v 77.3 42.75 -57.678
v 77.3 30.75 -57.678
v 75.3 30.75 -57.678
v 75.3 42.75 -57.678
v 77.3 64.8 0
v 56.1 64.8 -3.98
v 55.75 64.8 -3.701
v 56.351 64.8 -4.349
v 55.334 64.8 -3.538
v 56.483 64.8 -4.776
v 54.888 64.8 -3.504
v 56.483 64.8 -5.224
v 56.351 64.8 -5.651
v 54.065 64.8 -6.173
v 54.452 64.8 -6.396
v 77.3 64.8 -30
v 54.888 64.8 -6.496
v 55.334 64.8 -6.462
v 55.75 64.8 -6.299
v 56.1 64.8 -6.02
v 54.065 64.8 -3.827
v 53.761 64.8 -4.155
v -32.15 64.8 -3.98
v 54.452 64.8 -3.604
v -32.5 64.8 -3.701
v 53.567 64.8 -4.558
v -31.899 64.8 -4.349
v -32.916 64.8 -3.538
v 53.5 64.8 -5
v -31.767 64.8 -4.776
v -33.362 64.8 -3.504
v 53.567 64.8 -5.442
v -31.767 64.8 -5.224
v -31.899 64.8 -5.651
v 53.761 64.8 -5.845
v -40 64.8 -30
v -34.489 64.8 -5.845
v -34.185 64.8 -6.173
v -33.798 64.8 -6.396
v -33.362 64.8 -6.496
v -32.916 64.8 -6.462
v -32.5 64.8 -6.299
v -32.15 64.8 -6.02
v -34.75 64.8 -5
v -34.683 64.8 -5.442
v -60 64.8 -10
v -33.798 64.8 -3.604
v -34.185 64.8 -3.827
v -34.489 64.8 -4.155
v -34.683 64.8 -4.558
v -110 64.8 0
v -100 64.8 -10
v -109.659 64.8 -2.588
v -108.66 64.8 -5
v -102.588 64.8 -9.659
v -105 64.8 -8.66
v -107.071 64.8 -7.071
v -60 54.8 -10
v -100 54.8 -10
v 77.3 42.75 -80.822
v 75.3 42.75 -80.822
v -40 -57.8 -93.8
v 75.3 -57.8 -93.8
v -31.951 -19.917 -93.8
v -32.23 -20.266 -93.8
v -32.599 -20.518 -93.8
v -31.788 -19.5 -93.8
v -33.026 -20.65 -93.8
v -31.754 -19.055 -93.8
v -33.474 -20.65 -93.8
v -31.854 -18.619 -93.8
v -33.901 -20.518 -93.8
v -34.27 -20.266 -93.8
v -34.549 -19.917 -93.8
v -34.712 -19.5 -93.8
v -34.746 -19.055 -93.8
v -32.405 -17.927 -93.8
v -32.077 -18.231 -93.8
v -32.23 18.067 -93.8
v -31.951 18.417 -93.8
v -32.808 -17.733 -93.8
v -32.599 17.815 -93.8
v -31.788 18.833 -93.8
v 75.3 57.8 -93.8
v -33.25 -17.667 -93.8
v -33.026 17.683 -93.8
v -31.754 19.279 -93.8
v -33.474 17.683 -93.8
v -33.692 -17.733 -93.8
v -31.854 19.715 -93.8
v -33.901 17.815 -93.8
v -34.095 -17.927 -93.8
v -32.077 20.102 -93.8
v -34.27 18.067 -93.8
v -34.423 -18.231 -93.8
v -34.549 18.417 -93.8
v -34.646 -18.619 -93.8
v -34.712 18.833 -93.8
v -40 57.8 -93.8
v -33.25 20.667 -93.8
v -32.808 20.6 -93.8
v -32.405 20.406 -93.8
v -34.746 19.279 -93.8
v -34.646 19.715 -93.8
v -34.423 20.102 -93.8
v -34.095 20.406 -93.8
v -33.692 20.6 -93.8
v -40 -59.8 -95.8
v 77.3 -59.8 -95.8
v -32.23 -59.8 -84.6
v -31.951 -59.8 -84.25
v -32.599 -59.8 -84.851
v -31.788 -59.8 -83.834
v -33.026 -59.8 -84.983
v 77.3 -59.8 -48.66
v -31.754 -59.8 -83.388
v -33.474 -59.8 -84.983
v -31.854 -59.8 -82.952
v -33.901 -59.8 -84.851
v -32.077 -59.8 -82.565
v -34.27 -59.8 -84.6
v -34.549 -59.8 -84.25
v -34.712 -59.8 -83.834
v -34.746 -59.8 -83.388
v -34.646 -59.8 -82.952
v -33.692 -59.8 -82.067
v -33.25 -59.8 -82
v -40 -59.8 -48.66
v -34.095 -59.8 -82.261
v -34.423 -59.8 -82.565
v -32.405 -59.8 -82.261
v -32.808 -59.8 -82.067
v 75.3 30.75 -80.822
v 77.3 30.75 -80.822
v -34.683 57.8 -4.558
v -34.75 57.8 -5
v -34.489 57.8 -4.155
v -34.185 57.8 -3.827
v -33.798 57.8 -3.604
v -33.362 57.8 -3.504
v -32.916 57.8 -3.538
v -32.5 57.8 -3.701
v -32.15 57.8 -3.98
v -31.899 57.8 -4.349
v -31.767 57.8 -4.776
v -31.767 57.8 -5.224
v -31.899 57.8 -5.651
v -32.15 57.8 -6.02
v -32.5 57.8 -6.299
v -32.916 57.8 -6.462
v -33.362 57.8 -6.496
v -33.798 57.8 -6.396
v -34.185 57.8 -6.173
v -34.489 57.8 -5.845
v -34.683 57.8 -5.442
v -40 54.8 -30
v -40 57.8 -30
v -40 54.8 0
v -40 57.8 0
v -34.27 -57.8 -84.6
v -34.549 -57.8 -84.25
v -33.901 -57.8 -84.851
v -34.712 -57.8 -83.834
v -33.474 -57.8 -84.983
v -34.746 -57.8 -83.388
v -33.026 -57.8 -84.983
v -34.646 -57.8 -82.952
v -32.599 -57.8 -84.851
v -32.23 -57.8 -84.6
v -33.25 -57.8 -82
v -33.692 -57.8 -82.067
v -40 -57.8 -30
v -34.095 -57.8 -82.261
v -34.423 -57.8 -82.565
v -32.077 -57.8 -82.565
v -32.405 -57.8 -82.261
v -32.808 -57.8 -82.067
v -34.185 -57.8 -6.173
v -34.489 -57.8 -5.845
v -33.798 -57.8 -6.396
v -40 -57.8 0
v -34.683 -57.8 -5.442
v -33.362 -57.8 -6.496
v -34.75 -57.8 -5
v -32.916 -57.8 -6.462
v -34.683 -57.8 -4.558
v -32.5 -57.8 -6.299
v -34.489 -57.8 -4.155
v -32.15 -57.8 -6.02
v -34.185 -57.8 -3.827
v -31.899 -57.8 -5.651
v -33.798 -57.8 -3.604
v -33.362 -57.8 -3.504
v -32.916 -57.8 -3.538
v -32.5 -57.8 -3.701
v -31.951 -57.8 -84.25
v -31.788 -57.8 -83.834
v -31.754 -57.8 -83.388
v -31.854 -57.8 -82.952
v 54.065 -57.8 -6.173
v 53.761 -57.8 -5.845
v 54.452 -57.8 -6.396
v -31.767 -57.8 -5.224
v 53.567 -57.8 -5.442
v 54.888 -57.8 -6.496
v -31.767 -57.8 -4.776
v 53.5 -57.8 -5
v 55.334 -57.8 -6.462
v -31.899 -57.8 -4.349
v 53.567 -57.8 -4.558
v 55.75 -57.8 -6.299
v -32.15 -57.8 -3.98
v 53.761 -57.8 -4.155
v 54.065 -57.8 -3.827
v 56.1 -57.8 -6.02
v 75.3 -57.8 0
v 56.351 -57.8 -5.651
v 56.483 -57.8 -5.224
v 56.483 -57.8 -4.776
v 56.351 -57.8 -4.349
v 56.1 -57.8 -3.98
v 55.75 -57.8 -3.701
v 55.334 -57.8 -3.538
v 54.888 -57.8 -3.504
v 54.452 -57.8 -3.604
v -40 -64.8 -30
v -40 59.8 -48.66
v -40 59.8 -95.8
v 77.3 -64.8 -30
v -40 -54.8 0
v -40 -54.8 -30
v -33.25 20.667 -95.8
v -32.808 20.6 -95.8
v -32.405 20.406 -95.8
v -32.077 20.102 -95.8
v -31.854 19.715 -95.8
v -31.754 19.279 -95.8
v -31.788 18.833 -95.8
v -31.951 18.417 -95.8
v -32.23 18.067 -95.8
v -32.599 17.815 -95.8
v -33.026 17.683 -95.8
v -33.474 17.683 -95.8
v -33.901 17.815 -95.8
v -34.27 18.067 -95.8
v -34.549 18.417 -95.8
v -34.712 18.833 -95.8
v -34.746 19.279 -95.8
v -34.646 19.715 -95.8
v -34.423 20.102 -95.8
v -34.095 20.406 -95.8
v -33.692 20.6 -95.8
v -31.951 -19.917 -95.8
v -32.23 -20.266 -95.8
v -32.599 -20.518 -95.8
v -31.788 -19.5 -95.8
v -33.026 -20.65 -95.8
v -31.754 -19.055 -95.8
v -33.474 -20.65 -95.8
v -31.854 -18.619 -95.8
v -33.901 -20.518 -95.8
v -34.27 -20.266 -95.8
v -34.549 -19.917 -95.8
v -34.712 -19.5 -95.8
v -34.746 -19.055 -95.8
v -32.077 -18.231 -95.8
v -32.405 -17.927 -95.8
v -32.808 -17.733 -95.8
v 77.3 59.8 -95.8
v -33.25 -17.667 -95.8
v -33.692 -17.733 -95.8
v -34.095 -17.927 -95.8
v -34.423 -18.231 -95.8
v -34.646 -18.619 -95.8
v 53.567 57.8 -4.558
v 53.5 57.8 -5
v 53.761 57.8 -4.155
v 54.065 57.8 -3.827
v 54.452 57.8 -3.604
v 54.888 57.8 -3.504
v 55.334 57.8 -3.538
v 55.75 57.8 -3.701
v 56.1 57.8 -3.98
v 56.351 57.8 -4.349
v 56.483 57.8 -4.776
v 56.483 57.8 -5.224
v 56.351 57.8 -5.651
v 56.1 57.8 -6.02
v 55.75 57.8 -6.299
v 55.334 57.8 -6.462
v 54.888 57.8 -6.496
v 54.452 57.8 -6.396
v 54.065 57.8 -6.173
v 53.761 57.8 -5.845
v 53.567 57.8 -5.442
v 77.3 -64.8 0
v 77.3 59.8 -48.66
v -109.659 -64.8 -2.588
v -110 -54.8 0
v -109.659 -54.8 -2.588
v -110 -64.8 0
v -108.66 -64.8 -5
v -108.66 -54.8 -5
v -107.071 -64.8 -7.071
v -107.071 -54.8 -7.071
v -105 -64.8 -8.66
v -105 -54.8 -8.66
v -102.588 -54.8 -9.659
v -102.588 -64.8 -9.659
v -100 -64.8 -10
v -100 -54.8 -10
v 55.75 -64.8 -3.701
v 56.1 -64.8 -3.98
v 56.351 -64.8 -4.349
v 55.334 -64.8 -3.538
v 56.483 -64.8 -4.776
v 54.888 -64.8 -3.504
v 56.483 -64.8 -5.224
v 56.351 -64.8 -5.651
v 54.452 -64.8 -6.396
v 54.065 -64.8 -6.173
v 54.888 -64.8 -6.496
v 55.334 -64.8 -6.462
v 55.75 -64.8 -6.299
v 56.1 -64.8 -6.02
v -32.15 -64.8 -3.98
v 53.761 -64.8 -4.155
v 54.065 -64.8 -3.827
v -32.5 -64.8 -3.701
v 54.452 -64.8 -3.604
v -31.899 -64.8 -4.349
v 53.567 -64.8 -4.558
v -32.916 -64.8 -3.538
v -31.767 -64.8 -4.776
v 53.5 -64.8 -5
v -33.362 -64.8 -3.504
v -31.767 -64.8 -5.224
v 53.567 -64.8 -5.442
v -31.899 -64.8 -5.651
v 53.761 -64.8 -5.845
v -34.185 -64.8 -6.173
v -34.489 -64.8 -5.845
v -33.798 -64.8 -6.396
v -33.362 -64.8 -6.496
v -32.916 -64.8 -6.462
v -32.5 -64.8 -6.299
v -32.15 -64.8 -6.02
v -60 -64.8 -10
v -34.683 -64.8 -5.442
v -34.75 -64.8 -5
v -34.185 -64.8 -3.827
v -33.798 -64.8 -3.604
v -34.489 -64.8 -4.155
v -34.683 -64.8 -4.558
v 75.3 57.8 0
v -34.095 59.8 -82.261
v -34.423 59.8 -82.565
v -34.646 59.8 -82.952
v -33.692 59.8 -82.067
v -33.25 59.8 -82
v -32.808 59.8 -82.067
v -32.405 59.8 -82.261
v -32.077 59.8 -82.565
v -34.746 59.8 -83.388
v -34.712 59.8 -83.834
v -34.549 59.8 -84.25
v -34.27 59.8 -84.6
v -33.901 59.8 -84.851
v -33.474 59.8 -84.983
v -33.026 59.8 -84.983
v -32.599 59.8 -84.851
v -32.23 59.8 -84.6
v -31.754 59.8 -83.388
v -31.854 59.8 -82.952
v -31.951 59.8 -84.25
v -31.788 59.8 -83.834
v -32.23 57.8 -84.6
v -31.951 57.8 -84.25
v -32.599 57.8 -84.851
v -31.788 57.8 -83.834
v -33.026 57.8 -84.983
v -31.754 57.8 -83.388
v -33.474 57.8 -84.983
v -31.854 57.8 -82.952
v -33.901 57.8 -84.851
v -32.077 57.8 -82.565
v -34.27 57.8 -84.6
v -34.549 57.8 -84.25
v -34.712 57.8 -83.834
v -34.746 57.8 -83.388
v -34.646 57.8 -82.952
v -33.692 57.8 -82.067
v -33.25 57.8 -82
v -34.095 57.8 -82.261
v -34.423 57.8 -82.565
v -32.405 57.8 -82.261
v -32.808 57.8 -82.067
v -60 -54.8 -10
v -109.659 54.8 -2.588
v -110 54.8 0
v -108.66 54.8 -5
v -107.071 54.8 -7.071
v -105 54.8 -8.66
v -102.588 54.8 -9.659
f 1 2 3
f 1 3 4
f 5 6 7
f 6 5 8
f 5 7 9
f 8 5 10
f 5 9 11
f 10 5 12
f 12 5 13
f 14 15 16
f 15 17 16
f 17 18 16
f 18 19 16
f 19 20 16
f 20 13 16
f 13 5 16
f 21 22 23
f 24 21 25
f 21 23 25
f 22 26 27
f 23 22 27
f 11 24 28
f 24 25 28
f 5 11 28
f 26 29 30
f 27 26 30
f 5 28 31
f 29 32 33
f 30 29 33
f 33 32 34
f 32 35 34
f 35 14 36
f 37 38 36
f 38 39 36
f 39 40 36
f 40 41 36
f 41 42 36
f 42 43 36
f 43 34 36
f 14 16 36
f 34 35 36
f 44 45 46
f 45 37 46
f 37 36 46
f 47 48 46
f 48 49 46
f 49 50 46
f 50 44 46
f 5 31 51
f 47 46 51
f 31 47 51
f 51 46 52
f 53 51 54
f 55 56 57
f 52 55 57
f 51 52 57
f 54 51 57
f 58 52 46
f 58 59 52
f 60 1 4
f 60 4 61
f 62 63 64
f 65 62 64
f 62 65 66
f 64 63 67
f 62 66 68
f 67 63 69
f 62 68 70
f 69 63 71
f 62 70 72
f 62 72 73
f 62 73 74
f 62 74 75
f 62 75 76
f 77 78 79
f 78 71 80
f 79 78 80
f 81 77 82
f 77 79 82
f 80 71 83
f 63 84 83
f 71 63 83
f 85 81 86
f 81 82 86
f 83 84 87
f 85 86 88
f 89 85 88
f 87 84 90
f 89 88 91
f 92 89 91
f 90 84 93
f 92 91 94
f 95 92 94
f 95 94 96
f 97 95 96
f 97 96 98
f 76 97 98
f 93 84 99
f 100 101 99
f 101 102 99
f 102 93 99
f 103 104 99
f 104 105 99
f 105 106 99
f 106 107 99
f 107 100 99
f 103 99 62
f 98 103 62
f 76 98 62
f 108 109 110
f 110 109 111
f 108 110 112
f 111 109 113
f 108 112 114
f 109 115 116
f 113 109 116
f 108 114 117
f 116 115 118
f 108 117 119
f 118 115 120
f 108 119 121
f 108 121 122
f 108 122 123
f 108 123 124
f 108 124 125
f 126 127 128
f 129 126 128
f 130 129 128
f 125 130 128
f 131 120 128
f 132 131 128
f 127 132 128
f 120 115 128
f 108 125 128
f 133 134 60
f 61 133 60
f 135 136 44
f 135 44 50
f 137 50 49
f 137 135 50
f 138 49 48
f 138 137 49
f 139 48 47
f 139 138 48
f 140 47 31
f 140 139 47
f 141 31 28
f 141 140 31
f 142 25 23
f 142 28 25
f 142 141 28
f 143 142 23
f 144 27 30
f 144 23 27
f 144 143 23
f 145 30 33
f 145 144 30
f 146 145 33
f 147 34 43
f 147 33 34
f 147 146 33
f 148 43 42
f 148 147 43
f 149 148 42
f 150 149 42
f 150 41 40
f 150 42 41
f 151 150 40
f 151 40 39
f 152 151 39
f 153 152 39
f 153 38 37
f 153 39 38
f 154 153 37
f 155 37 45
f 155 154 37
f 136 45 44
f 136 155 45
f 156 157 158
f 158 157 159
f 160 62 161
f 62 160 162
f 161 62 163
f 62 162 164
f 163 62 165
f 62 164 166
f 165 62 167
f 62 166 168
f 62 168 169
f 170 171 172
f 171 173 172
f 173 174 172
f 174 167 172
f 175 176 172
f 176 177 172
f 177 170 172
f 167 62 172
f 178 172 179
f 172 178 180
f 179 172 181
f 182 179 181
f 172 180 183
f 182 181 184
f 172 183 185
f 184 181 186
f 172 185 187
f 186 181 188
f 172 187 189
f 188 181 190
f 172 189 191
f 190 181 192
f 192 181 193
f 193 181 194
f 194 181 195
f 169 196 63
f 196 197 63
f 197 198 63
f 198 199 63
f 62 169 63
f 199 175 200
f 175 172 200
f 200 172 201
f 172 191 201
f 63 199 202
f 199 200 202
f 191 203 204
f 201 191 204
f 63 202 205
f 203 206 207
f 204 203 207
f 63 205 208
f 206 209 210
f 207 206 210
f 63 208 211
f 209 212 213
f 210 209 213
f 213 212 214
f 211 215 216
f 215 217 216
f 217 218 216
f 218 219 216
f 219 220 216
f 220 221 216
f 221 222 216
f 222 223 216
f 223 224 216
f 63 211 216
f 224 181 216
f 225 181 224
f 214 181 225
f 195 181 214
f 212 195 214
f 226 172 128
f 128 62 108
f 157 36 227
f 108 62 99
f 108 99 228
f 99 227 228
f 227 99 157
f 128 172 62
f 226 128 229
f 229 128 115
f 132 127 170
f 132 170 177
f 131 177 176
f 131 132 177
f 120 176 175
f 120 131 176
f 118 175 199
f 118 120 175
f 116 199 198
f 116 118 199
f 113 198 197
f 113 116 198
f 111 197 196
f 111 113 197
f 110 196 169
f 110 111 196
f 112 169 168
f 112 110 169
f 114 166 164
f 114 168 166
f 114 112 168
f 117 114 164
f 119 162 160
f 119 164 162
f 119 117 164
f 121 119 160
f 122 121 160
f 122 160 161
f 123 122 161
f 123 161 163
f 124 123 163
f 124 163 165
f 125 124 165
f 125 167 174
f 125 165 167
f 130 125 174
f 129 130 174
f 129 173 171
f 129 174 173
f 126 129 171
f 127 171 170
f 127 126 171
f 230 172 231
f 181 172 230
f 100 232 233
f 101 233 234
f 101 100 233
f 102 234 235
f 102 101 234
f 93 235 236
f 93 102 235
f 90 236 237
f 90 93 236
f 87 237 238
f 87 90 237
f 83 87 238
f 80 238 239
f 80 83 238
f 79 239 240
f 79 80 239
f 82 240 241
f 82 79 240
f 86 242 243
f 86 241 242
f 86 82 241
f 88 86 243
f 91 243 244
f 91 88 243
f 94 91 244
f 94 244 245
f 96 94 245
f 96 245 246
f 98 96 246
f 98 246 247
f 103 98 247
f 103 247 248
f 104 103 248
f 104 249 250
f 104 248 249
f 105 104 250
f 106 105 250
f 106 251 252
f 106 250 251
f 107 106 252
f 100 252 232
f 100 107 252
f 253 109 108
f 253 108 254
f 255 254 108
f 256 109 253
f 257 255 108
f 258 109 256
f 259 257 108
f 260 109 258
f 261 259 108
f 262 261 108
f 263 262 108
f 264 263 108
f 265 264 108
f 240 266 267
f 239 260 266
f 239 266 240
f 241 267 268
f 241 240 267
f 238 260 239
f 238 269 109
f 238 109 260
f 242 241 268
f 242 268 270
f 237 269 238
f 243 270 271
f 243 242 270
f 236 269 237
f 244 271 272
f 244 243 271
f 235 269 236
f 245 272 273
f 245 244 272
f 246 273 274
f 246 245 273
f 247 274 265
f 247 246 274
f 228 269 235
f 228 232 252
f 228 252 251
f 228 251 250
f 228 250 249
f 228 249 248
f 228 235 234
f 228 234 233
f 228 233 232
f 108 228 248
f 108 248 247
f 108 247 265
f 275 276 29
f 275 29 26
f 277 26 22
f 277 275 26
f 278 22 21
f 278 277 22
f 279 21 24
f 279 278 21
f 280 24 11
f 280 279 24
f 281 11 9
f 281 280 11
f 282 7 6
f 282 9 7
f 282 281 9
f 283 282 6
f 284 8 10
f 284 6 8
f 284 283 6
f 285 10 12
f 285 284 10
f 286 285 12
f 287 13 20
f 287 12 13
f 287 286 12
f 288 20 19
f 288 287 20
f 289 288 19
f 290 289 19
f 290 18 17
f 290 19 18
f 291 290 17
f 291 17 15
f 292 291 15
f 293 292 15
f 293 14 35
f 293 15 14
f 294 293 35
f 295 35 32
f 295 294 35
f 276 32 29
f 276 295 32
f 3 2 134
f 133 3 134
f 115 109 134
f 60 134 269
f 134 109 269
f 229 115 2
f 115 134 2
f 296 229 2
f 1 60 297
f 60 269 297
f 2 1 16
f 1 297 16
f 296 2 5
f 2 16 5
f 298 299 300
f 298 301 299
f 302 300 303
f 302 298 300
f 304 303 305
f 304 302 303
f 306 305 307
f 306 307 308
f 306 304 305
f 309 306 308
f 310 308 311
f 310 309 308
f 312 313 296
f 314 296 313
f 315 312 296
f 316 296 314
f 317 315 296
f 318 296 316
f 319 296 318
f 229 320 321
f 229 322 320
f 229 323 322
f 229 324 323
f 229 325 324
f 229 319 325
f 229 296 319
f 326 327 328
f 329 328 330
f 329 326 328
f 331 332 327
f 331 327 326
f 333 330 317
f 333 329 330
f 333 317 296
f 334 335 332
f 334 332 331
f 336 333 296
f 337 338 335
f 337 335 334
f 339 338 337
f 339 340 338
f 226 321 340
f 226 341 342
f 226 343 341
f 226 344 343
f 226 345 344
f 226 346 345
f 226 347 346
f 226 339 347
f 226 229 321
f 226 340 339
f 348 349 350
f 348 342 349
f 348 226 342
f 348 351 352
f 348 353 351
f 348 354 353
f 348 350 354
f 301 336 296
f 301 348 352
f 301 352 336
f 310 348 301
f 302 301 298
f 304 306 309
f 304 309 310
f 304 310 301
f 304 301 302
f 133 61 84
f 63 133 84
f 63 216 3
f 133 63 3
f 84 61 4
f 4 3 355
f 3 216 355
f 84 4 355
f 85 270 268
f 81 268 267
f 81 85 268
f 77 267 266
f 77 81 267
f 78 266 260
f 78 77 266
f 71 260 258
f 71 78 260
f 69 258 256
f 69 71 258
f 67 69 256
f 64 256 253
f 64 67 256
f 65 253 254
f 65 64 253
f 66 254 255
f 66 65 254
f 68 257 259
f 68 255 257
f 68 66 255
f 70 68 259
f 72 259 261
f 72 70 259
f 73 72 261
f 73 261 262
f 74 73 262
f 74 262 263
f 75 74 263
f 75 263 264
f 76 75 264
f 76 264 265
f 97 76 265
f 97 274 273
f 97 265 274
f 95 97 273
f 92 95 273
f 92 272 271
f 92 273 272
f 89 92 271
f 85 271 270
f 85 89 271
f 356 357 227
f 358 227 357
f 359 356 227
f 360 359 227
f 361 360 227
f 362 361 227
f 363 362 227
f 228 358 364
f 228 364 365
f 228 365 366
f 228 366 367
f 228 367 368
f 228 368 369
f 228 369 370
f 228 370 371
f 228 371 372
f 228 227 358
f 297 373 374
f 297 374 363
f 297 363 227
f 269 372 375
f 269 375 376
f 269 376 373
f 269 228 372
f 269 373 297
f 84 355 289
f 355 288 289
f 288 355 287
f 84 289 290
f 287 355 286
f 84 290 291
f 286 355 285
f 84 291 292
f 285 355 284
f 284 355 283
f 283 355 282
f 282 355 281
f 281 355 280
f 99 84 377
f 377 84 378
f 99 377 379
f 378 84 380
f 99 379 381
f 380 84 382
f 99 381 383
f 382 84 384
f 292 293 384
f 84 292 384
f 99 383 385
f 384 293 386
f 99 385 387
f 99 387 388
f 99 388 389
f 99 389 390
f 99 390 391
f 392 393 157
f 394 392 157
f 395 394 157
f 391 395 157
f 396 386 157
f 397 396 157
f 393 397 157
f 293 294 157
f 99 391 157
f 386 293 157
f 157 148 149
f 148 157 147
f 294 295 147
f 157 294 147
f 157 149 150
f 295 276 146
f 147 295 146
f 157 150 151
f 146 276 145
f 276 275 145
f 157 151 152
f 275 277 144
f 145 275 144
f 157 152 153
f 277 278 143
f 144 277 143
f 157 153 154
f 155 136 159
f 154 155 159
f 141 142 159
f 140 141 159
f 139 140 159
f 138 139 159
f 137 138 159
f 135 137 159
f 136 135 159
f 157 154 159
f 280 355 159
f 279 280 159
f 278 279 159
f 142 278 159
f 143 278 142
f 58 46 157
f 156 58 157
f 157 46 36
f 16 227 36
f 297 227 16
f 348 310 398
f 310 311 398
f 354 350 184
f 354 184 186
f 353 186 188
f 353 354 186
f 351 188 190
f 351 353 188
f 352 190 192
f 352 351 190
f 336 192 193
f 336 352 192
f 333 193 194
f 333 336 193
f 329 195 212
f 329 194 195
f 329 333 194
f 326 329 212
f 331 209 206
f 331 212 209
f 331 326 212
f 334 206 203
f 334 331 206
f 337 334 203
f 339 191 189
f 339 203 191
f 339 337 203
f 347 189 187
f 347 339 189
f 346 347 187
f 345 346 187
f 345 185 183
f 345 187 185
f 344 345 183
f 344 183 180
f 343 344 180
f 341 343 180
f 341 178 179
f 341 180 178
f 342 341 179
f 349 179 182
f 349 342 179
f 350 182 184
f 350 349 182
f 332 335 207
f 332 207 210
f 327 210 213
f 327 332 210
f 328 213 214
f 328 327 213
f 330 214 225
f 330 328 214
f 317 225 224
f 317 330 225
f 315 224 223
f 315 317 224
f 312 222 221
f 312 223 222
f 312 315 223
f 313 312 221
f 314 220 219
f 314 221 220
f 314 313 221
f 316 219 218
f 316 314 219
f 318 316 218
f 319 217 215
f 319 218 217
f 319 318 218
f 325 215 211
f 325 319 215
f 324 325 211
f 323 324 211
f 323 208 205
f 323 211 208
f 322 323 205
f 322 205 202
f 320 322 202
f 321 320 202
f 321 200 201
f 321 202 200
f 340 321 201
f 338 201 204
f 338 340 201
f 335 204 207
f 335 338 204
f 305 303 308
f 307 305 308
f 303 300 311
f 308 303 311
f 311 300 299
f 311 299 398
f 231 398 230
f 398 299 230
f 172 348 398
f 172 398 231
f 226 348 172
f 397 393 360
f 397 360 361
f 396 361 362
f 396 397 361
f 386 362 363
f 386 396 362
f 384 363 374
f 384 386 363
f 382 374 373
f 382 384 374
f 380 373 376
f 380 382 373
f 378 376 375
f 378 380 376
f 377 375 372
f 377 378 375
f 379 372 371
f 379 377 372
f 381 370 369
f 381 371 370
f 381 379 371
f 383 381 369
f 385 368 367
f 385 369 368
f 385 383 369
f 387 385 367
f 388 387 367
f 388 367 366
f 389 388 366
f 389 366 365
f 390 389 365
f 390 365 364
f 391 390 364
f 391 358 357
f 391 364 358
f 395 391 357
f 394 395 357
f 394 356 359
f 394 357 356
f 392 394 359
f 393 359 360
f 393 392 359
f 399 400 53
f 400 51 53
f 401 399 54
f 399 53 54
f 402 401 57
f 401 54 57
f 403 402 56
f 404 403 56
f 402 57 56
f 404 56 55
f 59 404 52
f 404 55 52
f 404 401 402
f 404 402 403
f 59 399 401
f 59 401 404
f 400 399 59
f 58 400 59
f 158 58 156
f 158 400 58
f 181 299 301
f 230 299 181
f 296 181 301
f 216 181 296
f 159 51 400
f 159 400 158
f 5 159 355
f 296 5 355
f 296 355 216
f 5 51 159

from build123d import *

# Parameters (mm, degrees)
BOSS_EXTRUDE1_DEPTH     = 93.8
SKETCH2_W               = 117.3
SKETCH2_H               = 119.6
SKETCH2_R               = 1.5
BOSS_EXTRUDE2_DEPTH     = 2
SKETCH5_W               = 70
SKETCH5_H               = 10
BOSS_EXTRUDE3_DEPTH     = 5
BOSS_EXTRUDE4_DEPTH     = 5
CHAMFER1_SIZE           = 20
BOSS_EXTRUDE5_DEPTH     = 3
CHAMFER2_SIZE2          = 18.660254038
CHAMFER2_SIZE           = 5
FILLET1_R               = 10
SKETCH4_W               = 23.144126226
SKETCH4_H               = 12
CUT_EXTRUDE2_DEPTH      = 221.131710573
CUT_EXTRUDE1_DEPTH      = 192.840558798
CUT_EXTRUDE1_DEPTH_BACK = 192.840558798
SKETCH3_R               = 1.5


with BuildPart() as part:
    # Sketch1 → Boss-Extrude1 (new body)
    with BuildSketch(Plane.XY):
        Polygon((-40, -57.8), (75.3, -57.8), (75.3, 57.8), (-40, 57.8), (-40, 59.8), (77.3, 59.8), (77.3, -59.8), (-40, -59.8), align=None)
    extrude(amount=-BOSS_EXTRUDE1_DEPTH)

    # Sketch2 → Boss-Extrude2 (add)
    with BuildSketch(Plane(origin=(0, 0, -93.8), x_dir=(-1, 0, 0), z_dir=(0, 0, -1))):
        with Locations((-18.65, 0)):
            Rectangle(SKETCH2_W, SKETCH2_H)
        with Locations(Location((33.25, -19.166666667, 0), (0, 0, 90))):
            Circle(SKETCH2_R, mode=Mode.SUBTRACT)
        with Locations(Location((33.25, 19.166666667, 0), (0, 0, 90))):
            Circle(SKETCH2_R, mode=Mode.SUBTRACT)
    extrude(amount=BOSS_EXTRUDE2_DEPTH)

    # Sketch5 → Boss-Extrude3 (add)
    with BuildSketch(Plane(origin=(0, 59.8, 0), x_dir=(1, 0, 0), z_dir=(0, 1, 0))):
        with Locations((-75, 5)):
            Rectangle(SKETCH5_W, SKETCH5_H)
    extrude(amount=-BOSS_EXTRUDE3_DEPTH)

    # Sketch6 → Boss-Extrude4 (add)
    with BuildSketch(Plane(origin=(0, 59.8, 0), x_dir=(1, 0, 0), z_dir=(0, 1, 0))):
        Polygon((-110, 10), (-40, 10), (-40, 30), (77.3, 30), (77.3, 0), (0, 0), (-110, 0), align=None)
    extrude(amount=BOSS_EXTRUDE4_DEPTH)

    # Chamfer1
    chamfer1_edges = [part.edges().sort_by_distance(p)[0] for p in [
        (-40, 61.3, -10),
    ]]
    chamfer(chamfer1_edges, length=CHAMFER1_SIZE)

    # Sketch7 → Boss-Extrude5 (add)
    with BuildSketch(Plane.XZ.offset(-57.8)):
        Polygon((-60, -10), (-40, -30), (-40, -10), align=None)
    extrude(amount=BOSS_EXTRUDE5_DEPTH)

    # Chamfer2
    chamfer2_edges = [part.edges().sort_by_distance(p)[0] for p in [
        (18.65, 59.8, -30),
    ]]
    chamfer2_side = [part.faces().sort_by_distance(p)[0] for p in [
        (18.65, 59.9, -30),
    ]]
    chamfer(chamfer2_edges, length=CHAMFER2_SIZE - 0.0001, length2=CHAMFER2_SIZE2 - 0.0001, reference=chamfer2_side[0])  # a hair under: the kernel refuses the full size

    # Fillet1
    fillet1_edges = [part.edges().sort_by_distance(p)[0] for p in [
        (-110, 59.8, -10),
    ]]
    fillet(fillet1_edges, radius=FILLET1_R - 0.0001)  # a hair under: the kernel refuses the full size

    # Mirror5: part across plane


with BuildPart() as part_1:
    add(part.part)
    add(part.part.mirror(Plane.ZX))

    # Sketch4 → Cut-Extrude2 (cut, through all)
    with BuildSketch(Plane(origin=(77.3, 0, 0), x_dir=(0, 0, -1), z_dir=(1, 0, 0))):
        with Locations((69.25, 36.75)):
            Rectangle(SKETCH4_W, SKETCH4_H)
    extrude(amount=-CUT_EXTRUDE2_DEPTH, mode=Mode.SUBTRACT)

    # Sketch3 → Cut-Extrude1 (cut, two sides: drawn at the far end of the back side and taken through both)
    with BuildSketch(Plane(origin=(0, 59.8, 0), x_dir=(1, 0, 0), z_dir=(0, 1, 0)).offset(-CUT_EXTRUDE1_DEPTH_BACK)):
        with Locations(Location((55, 5, 0), (0, 0, 180))):
            Circle(SKETCH3_R)
        with Locations(Location((-33.25, 5, 0), (0, 0, 180))):
            Circle(SKETCH3_R)
        with Locations(Location((-33.25, 83.5, 0), (0, 0, 270))):
            Circle(SKETCH3_R)
    extrude(amount=CUT_EXTRUDE1_DEPTH + CUT_EXTRUDE1_DEPTH_BACK, mode=Mode.SUBTRACT)


solid = part_1.part
